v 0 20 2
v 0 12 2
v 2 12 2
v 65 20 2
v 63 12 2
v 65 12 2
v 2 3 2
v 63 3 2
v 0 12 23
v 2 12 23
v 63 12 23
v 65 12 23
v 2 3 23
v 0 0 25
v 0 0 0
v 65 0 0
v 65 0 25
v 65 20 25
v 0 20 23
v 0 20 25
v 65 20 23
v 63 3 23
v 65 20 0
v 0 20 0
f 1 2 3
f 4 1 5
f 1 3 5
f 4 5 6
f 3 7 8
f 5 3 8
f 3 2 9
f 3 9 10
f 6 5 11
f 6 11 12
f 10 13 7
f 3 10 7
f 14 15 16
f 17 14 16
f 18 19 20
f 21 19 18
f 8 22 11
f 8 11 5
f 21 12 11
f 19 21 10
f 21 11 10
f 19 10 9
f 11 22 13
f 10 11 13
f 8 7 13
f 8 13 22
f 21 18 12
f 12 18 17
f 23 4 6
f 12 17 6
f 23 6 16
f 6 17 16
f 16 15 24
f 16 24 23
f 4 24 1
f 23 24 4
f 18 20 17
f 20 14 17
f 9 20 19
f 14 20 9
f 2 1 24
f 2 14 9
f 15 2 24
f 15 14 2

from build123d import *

# Parameters (mm, degrees)
SKETCH1_W           = 65
SKETCH1_H           = 25
BOSS_EXTRUDE1_DEPTH = 3
SKETCH2_W           = 65
SKETCH2_H           = 2
BOSS_EXTRUDE2_DEPTH = 17
SKETCH2_3_W         = 2
SKETCH2_3_H         = 21
BOSS_EXTRUDE3_DEPTH = 9


with BuildPart() as part:
    # Sketch1 → Boss-Extrude1 (new body)
    with BuildSketch(Plane(origin=(0, 0, 0), x_dir=(1, 0, 0), z_dir=(0, 1, 0))):
        with Locations((32.5, -12.5)):
            Rectangle(SKETCH1_W, SKETCH1_H)
    extrude(amount=BOSS_EXTRUDE1_DEPTH)

    # Sketch2 → Boss-Extrude2 (add)
    with BuildSketch(Plane(origin=(0, 3, 0), x_dir=(1, 0, 0), z_dir=(0, 1, 0))):
        with Locations((32.5, -1)):
            Rectangle(SKETCH2_W, SKETCH2_H)
        with Locations((32.5, -24)):
            Rectangle(SKETCH2_W, SKETCH2_H)
    extrude(amount=BOSS_EXTRUDE2_DEPTH)

    # Sketch2<3> → Boss-Extrude3 (add)
    with BuildSketch(Plane(origin=(0, 3, 0), x_dir=(1, 0, 0), z_dir=(0, 1, 0))):
        with Locations((1, -12.5)):
            Rectangle(SKETCH2_3_W, SKETCH2_3_H)
        with Locations((64, -12.5)):
            Rectangle(SKETCH2_3_W, SKETCH2_3_H)
    extrude(amount=BOSS_EXTRUDE3_DEPTH)


solid = part.part
